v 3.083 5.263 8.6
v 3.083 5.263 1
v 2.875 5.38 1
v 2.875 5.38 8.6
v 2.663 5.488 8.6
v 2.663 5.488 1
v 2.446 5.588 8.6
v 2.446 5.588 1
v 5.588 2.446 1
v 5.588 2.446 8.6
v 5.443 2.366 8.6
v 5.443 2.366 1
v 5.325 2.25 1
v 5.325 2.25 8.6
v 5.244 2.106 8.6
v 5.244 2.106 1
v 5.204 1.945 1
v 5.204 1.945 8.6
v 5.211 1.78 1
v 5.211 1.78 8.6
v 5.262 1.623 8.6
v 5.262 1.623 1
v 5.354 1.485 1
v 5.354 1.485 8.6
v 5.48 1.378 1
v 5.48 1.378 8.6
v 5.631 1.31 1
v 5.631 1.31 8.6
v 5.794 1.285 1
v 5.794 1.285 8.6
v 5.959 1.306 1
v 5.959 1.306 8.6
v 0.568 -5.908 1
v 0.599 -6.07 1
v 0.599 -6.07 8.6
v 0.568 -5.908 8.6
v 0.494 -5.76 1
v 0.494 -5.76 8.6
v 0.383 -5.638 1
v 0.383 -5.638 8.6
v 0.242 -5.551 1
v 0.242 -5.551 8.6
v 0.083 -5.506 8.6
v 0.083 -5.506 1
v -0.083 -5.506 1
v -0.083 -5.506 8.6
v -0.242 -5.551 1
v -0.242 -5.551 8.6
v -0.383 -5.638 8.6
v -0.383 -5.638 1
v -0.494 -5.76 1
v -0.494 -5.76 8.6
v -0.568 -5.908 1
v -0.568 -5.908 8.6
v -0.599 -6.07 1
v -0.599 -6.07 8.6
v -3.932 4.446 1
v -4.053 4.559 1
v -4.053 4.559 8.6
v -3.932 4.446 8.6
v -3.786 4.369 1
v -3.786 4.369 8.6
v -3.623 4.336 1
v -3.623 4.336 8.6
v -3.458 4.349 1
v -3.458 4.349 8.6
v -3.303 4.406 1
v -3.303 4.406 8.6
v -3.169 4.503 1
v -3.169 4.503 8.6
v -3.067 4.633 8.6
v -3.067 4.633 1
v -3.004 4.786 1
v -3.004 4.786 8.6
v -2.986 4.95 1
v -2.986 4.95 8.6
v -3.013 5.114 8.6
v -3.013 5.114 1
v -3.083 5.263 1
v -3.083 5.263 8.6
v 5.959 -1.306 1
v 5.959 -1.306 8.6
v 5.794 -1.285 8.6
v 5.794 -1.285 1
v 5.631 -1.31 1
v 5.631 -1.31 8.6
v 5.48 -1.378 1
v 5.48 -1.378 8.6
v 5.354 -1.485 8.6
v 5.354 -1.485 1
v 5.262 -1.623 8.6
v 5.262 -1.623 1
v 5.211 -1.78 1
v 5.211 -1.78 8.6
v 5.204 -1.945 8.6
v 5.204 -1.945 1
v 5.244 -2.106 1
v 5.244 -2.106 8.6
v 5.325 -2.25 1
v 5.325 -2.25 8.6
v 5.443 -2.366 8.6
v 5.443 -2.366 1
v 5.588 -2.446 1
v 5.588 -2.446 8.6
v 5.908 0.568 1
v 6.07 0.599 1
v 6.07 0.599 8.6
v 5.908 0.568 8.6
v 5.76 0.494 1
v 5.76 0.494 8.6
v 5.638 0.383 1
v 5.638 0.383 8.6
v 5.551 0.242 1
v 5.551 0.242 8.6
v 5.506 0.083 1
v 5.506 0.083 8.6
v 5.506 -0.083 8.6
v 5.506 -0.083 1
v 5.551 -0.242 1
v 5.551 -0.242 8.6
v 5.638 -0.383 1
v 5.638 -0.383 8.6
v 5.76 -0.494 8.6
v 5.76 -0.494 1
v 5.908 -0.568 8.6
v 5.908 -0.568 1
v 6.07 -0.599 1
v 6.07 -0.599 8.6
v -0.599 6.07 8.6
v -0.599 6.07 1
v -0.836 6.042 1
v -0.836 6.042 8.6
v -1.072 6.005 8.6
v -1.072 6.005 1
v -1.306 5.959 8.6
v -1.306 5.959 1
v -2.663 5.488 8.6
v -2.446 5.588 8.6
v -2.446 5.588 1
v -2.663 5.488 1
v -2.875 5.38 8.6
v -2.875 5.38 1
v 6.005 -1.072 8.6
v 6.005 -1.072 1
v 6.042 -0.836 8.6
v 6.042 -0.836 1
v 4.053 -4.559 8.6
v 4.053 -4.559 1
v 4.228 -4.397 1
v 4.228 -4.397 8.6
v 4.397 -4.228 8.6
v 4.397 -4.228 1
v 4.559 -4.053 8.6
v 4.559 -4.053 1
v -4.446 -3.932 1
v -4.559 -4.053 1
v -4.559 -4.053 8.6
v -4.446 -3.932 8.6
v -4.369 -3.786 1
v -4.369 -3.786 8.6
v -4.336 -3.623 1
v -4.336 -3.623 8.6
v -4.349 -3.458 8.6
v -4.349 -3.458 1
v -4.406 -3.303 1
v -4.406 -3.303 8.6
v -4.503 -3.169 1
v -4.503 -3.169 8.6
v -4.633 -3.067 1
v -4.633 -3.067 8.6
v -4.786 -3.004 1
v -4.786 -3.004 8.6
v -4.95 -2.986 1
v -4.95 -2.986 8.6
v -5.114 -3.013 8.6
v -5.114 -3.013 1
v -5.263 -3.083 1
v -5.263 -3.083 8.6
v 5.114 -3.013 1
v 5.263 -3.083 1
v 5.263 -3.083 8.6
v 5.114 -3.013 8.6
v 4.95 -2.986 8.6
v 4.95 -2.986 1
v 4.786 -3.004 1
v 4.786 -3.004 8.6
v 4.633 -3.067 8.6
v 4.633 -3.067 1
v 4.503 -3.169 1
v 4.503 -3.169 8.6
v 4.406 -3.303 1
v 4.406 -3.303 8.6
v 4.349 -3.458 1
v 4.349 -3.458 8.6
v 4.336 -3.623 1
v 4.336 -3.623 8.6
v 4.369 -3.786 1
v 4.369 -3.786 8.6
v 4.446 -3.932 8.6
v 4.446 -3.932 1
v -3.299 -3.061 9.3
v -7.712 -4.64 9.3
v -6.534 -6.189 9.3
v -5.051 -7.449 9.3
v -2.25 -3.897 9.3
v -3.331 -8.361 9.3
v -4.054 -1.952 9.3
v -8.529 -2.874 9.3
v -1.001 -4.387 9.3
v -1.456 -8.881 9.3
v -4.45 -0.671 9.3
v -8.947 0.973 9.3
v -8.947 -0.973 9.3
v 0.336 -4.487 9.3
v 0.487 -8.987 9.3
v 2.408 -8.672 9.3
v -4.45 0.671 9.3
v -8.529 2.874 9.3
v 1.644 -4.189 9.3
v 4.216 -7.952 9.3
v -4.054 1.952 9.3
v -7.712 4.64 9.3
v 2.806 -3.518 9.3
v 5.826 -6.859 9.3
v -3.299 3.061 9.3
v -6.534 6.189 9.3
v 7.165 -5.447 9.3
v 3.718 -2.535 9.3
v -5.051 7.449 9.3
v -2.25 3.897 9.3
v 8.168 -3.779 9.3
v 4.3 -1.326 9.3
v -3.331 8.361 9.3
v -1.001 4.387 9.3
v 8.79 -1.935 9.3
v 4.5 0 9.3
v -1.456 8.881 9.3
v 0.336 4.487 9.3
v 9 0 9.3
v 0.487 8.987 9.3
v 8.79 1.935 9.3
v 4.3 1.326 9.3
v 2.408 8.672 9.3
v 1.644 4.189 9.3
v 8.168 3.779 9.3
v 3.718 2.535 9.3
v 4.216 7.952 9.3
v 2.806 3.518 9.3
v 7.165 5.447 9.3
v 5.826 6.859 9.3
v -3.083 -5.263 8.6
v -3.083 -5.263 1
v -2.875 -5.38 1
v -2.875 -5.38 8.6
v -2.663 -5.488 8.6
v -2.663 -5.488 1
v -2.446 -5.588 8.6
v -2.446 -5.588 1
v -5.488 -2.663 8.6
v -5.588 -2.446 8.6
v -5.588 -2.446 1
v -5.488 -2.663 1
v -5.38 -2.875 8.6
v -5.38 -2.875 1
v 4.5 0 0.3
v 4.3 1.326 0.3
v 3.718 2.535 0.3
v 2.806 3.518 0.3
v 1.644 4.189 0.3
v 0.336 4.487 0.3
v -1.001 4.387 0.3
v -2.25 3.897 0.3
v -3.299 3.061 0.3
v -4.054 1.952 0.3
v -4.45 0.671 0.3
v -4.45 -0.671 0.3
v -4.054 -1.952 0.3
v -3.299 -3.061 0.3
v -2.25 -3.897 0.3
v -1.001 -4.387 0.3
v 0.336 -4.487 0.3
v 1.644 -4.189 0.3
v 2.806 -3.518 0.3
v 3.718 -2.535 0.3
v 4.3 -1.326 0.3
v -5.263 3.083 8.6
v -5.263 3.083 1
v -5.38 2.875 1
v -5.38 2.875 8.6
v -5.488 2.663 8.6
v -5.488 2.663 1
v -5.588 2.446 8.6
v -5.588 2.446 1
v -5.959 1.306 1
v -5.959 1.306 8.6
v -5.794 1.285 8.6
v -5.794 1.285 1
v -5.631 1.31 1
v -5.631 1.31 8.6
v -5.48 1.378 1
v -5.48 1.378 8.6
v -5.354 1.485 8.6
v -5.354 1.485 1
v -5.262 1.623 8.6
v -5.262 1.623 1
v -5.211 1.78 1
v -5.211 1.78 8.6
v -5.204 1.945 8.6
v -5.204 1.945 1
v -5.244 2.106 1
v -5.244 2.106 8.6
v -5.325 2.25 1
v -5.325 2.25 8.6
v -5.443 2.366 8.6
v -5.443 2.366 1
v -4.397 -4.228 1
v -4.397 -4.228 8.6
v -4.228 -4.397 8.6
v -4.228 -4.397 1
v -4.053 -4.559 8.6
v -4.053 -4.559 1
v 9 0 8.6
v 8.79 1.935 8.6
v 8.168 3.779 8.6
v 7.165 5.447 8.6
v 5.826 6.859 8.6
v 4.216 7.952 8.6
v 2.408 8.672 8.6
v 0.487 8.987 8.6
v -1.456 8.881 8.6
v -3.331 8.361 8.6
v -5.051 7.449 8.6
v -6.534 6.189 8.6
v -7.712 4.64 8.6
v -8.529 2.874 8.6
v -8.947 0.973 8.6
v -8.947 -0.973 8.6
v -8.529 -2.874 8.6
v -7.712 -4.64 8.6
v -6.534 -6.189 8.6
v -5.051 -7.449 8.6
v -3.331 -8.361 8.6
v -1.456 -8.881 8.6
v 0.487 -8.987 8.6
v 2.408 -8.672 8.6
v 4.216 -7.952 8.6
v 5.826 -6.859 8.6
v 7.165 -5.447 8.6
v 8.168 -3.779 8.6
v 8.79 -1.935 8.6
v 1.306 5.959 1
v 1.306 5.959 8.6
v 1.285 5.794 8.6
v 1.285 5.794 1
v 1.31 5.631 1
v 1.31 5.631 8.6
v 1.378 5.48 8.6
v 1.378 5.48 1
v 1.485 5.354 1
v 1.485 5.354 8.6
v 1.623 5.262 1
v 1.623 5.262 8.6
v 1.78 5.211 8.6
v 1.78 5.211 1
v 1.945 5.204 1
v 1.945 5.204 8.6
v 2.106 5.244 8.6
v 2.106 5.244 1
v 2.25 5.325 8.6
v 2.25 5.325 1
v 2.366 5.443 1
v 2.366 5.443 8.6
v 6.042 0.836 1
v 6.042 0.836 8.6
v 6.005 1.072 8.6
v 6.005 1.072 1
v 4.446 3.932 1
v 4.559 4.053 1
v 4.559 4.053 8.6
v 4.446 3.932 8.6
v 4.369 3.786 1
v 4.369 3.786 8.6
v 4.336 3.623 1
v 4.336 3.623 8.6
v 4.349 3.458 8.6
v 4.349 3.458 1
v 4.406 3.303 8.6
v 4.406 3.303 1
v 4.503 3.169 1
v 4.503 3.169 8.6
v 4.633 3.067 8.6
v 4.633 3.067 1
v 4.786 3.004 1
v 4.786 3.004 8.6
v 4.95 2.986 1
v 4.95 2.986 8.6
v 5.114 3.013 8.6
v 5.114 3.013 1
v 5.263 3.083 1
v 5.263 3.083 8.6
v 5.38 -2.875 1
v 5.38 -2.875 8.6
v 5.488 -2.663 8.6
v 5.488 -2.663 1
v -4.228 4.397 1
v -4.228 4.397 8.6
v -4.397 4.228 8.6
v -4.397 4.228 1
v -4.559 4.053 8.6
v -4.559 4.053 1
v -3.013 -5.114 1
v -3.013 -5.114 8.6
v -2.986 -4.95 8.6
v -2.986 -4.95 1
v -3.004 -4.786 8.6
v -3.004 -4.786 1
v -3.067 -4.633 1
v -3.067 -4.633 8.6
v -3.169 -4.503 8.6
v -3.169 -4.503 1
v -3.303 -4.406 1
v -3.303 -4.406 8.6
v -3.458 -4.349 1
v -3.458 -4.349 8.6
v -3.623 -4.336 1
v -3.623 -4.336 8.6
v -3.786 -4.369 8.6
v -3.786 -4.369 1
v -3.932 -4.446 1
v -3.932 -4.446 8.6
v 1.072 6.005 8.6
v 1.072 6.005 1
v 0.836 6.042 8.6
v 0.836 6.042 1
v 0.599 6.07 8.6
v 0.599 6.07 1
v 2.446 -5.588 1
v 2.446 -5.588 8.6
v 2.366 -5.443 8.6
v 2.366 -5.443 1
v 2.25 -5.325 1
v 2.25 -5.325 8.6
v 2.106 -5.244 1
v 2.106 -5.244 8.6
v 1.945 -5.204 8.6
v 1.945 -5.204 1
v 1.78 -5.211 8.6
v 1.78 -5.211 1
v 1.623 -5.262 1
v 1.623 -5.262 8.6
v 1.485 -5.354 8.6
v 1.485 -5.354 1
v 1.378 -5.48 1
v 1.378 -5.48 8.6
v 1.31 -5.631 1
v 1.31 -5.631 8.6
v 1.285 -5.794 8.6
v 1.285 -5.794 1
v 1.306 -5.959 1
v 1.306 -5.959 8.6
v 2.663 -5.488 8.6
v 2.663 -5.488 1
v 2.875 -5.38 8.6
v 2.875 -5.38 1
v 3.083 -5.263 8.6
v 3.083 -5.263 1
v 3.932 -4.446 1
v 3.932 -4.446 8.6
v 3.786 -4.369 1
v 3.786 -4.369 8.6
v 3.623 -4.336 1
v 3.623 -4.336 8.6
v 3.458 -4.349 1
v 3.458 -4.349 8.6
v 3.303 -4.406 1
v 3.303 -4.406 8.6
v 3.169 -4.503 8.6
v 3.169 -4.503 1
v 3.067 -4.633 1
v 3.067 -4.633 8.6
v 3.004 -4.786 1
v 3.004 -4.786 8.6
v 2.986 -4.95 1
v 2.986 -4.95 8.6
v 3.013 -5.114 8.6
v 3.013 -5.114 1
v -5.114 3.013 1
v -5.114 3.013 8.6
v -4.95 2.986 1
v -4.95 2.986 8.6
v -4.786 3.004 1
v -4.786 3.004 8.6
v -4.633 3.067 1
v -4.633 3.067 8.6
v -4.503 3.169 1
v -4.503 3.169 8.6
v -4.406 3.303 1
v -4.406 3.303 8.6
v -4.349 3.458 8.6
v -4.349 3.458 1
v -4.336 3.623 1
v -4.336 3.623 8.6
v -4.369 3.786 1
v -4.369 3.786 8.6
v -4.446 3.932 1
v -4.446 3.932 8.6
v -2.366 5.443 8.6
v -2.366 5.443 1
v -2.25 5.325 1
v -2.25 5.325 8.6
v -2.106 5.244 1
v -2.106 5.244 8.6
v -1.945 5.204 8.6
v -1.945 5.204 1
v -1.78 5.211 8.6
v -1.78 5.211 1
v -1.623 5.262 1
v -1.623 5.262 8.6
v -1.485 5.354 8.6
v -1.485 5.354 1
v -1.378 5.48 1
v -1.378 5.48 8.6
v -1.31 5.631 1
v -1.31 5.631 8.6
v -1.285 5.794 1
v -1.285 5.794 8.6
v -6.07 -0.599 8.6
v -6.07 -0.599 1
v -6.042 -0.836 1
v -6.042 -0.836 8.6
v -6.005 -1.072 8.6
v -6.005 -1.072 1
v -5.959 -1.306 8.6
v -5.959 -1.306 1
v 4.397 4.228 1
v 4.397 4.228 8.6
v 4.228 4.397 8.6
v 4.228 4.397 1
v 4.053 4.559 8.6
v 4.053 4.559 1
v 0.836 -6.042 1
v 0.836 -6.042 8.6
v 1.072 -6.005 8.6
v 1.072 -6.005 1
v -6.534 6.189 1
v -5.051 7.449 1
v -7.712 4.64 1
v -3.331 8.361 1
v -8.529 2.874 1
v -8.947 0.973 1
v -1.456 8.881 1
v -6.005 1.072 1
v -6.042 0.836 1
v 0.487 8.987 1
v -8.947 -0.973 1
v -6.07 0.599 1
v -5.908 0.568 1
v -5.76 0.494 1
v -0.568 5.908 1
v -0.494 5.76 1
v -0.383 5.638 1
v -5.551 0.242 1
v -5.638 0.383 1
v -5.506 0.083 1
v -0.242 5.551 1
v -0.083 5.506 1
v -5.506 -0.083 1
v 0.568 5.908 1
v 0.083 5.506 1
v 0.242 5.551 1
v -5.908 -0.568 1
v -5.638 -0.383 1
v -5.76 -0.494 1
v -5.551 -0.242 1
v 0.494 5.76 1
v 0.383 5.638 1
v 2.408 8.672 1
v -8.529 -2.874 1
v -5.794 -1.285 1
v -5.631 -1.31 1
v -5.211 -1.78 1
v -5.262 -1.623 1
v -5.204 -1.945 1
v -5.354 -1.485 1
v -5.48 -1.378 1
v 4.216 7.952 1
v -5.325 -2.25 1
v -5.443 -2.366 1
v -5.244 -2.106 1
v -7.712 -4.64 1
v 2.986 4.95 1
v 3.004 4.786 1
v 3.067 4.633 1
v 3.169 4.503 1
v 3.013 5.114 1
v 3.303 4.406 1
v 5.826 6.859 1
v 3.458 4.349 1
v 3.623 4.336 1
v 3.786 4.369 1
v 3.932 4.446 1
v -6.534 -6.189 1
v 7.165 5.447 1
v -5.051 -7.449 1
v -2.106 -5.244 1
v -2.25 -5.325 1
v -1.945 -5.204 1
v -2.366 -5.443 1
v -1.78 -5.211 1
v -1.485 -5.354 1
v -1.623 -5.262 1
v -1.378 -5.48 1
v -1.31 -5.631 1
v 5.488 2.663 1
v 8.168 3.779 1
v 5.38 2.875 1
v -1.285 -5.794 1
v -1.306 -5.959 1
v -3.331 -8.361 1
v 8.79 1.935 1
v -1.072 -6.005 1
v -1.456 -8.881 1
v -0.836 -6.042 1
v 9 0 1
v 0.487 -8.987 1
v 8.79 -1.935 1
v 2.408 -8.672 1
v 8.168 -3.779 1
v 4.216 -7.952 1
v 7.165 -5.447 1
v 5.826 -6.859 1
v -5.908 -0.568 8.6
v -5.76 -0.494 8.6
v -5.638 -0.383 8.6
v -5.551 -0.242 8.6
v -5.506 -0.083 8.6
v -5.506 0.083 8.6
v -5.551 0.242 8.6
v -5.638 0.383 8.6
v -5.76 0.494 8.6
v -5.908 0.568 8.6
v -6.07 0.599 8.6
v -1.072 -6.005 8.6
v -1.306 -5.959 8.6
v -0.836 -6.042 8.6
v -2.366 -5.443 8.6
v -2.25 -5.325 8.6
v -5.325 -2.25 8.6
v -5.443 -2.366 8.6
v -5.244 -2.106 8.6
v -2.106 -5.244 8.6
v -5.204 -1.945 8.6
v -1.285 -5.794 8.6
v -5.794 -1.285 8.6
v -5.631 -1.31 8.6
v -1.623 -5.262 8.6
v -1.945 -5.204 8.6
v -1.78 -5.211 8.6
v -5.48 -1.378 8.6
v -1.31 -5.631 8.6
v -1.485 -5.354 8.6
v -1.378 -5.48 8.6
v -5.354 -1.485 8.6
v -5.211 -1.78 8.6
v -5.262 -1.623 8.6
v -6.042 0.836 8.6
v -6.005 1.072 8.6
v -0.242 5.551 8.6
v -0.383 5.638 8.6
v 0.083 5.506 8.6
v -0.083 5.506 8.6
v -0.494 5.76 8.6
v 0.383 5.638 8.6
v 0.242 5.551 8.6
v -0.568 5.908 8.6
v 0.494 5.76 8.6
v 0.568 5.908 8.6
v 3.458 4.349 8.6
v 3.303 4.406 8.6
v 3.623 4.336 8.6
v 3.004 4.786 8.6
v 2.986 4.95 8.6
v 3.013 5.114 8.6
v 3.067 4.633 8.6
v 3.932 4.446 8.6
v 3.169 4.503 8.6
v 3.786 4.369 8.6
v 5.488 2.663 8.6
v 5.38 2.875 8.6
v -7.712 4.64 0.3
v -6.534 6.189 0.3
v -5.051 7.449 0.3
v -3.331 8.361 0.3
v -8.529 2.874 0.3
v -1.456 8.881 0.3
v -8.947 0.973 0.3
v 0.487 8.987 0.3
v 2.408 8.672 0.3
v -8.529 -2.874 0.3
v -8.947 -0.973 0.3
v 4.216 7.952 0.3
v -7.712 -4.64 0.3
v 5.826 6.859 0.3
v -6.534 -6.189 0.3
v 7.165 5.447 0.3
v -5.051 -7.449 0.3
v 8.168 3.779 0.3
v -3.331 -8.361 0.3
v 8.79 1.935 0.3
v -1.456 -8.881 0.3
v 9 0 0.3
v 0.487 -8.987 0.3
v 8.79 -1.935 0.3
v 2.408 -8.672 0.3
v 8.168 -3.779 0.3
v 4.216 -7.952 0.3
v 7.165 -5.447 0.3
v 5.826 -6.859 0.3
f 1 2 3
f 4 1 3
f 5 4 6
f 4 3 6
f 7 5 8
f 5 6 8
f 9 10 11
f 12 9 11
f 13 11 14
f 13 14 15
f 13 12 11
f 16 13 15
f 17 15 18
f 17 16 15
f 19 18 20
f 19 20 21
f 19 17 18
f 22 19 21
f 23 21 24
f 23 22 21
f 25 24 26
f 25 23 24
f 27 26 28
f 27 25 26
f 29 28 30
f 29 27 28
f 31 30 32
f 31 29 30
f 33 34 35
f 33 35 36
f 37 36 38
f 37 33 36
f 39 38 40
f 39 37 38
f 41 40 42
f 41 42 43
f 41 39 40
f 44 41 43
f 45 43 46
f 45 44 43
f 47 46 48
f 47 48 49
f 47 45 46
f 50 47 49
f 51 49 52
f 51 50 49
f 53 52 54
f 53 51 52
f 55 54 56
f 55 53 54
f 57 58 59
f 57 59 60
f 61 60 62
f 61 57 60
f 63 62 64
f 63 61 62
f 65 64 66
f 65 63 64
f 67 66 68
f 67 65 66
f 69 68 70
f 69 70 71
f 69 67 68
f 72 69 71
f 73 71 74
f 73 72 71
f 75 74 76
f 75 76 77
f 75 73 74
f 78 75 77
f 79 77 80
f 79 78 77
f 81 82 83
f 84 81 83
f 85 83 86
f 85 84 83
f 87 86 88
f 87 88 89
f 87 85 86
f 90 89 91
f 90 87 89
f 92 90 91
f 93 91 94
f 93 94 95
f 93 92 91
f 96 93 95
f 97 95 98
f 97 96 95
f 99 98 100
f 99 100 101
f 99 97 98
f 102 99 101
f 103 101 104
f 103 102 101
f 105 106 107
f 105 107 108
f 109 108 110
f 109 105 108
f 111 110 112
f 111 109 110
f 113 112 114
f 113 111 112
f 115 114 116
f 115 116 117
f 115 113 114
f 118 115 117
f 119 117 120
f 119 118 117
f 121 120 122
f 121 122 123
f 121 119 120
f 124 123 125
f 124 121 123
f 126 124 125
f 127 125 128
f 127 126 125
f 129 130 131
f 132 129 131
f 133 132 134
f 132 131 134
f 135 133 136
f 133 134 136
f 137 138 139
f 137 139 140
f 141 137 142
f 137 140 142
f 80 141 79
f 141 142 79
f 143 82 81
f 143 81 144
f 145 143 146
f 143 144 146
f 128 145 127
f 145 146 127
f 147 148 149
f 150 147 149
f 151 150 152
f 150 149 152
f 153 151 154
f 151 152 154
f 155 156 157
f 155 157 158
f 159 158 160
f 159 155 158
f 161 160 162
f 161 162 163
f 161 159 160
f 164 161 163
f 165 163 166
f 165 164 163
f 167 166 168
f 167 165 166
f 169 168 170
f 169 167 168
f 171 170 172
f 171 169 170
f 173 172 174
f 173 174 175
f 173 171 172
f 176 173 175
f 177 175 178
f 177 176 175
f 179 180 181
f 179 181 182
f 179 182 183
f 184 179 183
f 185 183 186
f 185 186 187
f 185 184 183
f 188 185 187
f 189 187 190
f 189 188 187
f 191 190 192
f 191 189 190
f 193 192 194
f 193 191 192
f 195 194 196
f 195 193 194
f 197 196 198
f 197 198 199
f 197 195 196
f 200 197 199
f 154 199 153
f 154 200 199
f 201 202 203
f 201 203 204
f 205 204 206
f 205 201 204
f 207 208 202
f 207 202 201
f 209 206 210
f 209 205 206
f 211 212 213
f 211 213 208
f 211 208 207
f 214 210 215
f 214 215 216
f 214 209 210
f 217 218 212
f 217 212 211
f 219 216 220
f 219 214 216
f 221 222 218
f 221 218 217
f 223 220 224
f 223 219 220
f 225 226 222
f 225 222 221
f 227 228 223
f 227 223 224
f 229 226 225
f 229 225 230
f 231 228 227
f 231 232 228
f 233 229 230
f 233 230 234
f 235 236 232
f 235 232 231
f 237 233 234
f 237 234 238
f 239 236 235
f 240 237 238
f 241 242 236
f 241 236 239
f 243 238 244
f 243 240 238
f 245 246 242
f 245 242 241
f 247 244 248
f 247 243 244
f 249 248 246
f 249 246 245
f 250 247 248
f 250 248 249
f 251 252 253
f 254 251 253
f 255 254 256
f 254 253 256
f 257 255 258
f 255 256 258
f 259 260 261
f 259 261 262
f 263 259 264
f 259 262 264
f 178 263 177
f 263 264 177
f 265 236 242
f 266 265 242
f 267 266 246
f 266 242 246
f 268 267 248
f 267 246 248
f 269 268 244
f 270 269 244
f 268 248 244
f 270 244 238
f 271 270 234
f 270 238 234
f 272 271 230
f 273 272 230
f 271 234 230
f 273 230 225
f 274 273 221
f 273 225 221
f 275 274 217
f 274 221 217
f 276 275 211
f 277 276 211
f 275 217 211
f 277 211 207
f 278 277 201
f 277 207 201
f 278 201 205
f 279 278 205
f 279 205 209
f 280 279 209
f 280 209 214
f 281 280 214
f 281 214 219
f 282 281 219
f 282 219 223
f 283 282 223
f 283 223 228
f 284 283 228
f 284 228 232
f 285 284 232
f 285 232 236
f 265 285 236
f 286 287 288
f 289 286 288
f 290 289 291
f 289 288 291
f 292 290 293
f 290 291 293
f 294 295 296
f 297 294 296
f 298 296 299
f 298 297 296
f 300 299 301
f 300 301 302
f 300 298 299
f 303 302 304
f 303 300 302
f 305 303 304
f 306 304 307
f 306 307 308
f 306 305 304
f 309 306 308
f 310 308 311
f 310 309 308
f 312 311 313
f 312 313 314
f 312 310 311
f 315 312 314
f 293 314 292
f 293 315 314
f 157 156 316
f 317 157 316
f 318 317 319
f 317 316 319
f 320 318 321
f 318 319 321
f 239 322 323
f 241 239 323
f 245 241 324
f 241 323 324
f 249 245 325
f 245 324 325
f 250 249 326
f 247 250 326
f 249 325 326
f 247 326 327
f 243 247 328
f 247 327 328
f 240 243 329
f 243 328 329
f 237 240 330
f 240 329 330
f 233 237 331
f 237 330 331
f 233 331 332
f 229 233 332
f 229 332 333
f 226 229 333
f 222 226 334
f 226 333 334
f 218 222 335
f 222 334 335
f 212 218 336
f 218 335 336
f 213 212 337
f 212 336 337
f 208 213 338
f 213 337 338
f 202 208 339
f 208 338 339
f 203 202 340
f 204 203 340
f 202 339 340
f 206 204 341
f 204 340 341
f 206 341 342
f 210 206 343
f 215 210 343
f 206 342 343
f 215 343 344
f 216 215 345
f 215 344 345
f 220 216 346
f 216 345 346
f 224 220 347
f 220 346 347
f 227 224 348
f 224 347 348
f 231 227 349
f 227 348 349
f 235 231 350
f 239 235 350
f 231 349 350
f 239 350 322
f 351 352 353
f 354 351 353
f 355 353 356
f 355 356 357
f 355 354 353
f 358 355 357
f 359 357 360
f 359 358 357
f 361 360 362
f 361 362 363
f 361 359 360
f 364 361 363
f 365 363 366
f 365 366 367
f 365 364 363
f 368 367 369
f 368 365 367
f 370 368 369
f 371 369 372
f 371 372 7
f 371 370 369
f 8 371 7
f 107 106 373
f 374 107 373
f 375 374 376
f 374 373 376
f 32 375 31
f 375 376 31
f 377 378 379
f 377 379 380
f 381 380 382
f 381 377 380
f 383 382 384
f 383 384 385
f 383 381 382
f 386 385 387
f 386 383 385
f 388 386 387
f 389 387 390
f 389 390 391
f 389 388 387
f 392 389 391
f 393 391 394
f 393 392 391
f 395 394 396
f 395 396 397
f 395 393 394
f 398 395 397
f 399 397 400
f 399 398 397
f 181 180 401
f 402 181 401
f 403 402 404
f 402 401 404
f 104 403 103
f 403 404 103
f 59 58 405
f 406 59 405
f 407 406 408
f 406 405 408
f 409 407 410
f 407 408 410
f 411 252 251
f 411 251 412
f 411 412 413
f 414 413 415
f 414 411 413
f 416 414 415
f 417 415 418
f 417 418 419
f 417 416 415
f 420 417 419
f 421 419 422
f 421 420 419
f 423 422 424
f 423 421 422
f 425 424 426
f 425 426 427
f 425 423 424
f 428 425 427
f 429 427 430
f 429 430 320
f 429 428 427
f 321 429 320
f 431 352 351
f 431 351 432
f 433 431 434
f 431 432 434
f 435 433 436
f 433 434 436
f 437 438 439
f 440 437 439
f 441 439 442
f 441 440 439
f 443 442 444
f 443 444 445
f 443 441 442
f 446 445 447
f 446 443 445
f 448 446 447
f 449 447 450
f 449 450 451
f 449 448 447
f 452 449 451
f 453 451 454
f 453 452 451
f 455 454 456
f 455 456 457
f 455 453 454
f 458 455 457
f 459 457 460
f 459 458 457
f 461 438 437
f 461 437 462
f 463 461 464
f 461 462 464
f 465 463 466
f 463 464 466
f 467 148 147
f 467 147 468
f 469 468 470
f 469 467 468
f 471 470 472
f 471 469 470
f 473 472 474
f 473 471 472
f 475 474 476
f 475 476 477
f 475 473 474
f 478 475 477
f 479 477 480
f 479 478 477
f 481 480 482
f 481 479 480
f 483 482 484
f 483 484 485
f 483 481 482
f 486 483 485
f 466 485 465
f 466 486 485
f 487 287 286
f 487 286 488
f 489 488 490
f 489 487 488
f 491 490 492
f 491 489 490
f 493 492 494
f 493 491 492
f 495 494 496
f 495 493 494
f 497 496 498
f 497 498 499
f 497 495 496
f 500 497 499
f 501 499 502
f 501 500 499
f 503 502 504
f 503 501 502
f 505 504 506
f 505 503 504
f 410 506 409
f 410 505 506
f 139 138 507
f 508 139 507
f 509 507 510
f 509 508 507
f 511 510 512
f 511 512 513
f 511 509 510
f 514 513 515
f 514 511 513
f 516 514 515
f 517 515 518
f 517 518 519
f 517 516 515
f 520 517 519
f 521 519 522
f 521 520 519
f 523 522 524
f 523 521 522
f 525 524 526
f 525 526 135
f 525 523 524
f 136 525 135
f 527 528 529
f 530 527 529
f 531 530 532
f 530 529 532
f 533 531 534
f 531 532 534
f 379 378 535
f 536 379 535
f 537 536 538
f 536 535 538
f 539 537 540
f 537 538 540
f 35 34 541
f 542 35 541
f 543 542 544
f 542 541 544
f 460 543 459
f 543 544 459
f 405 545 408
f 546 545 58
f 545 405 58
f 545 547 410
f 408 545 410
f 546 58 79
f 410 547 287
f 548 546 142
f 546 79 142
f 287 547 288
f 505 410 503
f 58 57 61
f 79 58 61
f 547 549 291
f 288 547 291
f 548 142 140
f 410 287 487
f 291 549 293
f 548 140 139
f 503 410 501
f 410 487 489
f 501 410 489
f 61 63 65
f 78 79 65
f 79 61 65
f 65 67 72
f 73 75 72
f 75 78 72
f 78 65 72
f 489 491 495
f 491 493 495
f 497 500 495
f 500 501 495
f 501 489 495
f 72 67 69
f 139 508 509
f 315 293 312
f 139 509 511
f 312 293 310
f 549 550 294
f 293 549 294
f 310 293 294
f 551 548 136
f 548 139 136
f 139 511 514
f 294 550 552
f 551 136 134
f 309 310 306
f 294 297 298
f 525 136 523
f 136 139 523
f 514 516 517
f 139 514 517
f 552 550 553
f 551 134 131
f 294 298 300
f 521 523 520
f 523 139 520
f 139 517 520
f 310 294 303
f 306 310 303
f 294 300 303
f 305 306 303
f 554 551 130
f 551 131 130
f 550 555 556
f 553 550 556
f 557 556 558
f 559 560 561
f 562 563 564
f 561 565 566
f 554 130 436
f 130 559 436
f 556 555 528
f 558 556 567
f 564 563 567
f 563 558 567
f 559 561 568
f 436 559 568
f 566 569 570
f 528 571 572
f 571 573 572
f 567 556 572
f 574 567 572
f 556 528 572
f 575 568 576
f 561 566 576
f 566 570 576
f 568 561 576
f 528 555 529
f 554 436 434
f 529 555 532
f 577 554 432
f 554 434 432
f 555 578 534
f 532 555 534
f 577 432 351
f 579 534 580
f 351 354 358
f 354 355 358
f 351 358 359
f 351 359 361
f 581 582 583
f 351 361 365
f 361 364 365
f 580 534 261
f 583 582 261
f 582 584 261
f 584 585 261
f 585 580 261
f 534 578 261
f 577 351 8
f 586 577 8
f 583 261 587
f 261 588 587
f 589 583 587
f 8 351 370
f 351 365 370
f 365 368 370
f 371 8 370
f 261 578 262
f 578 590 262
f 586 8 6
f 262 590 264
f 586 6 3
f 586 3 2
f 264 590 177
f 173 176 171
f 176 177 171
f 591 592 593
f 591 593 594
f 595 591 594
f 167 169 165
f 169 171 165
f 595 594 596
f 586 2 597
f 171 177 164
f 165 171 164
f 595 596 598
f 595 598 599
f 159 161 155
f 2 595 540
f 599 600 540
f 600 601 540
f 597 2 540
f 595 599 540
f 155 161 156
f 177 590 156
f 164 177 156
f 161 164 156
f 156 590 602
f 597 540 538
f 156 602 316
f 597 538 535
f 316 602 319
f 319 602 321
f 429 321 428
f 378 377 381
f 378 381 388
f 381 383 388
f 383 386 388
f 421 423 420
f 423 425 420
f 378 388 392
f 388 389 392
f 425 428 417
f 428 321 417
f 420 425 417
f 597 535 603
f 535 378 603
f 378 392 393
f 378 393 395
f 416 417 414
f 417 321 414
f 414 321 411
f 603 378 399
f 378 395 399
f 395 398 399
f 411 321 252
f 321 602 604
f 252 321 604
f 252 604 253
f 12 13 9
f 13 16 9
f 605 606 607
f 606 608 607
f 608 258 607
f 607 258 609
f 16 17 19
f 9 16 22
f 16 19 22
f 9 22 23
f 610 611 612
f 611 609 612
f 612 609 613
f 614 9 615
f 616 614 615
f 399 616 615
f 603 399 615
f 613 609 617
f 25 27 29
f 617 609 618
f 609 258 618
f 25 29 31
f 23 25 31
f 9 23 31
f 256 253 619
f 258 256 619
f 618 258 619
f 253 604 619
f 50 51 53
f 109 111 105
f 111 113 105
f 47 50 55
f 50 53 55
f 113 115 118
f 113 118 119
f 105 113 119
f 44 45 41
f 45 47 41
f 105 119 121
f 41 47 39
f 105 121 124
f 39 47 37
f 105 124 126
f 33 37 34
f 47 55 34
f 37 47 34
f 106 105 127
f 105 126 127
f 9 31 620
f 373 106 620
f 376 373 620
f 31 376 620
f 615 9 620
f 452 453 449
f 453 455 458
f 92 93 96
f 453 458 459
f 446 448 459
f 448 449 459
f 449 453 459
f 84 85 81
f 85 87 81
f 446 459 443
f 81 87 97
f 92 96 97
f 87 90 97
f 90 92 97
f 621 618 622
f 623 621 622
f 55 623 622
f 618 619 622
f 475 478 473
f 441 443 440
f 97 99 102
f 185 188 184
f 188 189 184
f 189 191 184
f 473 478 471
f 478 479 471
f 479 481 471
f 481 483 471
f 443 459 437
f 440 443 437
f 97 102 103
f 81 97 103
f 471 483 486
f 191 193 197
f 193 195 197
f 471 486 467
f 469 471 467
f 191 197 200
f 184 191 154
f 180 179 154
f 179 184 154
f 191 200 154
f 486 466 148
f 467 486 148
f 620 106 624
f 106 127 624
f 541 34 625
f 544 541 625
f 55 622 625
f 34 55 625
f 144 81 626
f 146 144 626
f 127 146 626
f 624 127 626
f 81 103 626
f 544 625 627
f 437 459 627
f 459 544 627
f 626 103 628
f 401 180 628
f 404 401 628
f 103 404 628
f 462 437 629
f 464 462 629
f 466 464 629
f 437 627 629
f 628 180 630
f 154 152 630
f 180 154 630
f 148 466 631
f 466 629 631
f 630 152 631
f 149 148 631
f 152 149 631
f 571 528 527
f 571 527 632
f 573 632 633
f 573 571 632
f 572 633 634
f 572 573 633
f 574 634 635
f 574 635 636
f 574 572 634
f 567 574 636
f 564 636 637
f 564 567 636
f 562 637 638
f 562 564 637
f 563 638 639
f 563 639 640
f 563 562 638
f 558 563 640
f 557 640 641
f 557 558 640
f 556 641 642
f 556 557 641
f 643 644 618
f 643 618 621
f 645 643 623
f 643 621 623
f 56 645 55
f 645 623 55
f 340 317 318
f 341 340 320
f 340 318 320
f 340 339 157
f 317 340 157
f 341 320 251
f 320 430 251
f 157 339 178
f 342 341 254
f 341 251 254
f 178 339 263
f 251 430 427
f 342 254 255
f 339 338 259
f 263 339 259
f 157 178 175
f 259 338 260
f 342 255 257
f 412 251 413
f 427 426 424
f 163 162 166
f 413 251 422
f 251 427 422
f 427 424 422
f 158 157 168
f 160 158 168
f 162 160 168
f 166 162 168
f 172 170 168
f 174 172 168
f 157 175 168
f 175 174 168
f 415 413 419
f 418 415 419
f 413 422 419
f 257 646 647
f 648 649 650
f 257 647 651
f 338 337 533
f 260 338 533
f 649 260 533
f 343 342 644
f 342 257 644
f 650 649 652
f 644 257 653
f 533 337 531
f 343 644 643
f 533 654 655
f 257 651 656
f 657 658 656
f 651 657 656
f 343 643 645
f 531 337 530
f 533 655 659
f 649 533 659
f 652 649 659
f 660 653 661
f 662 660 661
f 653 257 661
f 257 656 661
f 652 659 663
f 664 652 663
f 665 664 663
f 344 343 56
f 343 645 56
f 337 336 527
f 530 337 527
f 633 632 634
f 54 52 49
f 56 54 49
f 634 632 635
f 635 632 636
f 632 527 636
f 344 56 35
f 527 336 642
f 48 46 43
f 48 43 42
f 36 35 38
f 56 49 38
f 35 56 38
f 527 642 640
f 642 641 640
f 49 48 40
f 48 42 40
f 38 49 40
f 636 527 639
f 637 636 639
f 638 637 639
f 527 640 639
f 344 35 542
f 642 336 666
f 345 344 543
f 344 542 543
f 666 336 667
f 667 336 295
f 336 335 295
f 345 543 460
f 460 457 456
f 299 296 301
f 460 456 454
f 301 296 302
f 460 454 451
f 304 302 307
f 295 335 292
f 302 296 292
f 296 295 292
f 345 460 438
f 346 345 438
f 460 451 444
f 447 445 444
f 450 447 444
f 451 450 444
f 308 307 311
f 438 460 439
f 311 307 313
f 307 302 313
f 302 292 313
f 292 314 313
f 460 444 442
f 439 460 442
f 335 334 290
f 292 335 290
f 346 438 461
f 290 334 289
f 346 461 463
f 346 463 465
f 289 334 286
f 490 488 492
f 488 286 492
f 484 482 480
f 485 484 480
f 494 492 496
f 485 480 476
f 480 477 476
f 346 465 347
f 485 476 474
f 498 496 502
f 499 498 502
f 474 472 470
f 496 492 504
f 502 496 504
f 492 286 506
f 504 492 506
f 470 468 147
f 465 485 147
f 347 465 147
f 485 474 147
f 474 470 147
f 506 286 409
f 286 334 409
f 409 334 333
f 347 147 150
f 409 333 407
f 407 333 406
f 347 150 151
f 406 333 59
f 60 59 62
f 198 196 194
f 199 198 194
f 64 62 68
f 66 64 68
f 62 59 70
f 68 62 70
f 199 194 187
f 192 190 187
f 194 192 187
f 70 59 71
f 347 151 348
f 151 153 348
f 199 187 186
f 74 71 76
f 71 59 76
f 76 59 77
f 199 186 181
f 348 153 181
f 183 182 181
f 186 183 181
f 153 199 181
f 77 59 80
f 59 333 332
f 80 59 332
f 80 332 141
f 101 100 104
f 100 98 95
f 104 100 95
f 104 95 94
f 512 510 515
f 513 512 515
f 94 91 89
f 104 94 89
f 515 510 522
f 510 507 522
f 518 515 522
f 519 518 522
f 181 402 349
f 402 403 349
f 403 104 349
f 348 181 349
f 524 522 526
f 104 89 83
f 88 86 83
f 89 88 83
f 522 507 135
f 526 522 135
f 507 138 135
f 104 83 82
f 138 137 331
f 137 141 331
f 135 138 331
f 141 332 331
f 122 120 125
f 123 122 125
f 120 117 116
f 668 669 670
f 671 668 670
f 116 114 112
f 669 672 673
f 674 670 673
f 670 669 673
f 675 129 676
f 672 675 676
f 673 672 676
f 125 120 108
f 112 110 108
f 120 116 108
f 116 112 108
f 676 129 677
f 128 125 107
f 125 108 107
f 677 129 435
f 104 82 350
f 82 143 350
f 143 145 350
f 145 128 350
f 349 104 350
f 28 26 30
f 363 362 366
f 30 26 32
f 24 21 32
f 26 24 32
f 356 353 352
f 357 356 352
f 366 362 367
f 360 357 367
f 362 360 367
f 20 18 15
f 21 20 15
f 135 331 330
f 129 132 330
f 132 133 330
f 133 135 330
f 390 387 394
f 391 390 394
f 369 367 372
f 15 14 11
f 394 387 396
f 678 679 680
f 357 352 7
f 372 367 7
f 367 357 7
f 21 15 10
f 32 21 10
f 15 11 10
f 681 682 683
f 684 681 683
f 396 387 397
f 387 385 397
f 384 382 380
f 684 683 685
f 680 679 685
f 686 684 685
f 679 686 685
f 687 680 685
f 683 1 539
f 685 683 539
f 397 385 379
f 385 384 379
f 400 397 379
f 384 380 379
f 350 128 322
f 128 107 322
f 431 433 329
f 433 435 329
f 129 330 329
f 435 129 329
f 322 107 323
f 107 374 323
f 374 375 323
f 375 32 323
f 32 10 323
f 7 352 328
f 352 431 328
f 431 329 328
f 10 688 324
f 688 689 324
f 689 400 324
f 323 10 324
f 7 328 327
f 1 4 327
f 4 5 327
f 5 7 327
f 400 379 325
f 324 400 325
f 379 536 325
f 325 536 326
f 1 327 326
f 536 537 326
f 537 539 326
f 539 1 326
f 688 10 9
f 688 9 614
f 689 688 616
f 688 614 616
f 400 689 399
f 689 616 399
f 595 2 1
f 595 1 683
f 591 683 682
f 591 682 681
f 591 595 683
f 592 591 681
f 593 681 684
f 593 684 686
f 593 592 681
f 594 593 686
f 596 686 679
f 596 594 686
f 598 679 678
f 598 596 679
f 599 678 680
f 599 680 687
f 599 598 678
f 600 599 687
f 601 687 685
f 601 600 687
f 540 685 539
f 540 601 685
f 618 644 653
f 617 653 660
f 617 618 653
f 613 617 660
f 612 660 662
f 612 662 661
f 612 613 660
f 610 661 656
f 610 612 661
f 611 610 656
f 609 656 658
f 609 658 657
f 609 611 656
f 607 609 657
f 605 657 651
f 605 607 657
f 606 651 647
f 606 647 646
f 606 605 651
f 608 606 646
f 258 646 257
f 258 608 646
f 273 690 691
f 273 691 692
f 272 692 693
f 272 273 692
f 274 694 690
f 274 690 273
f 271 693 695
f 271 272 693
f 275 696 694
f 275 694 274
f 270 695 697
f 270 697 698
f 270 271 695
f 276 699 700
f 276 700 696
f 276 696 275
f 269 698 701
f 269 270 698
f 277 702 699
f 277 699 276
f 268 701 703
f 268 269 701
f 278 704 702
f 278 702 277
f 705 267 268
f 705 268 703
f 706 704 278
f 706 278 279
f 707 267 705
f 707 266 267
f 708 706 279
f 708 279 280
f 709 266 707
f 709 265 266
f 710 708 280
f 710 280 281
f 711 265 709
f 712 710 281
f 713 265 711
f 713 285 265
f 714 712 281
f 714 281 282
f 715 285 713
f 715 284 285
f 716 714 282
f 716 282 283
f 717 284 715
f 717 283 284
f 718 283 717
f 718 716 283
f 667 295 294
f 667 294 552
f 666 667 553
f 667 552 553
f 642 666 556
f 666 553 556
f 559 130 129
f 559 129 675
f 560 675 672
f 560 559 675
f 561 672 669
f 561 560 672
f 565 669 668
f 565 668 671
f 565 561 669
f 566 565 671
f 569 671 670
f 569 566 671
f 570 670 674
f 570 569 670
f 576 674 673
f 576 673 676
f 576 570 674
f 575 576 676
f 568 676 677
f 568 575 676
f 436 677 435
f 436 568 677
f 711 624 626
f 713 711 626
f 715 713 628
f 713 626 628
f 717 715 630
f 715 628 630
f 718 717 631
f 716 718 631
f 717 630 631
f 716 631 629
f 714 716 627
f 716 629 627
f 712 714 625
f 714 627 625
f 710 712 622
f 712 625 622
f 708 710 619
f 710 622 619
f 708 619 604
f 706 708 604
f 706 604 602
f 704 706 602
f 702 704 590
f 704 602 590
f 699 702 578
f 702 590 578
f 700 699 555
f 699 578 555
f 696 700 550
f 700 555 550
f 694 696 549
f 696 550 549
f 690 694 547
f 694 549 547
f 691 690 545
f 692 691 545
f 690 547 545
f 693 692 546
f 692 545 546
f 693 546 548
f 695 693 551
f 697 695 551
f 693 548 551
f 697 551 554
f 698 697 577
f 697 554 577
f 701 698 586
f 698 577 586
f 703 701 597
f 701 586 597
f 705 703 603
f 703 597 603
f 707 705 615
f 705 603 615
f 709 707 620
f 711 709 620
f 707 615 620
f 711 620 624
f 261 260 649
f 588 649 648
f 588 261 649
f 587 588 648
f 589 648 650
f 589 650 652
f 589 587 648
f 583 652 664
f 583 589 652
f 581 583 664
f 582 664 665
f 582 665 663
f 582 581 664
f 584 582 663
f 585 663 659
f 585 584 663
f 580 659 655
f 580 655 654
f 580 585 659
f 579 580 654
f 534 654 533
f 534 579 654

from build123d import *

# Parameters (mm, degrees)
CYLINDER_R        = 0.6
CYLINDER_DEPTH    = 7.6
ARRAY_COUNT       = 20
CYLINDER001_R     = 6.1
CYLINDER001_DEPTH = 7.6
SKETCH_R          = 9
PAD_DEPTH         = 0.7
SKETCH001_R       = 9
PAD001_DEPTH      = 0.7
SKETCH002_R       = 4.5
POCKET_DEPTH      = 9.001


with BuildPart() as array:
    # Cylinder → Cylinder (new body)
    with BuildSketch(Plane(origin=(6.1, 0, 0), x_dir=(1, 0, 0), z_dir=(0, 0, 1))):
        Circle(CYLINDER_R)
    extrude(amount=CYLINDER_DEPTH)

    # Array: Array ×20 about axis
    array_axis = Axis((0, 0, 0), (0, 0, 1))


with BuildPart() as array_1:
    add(array.part)
    for i in range(1, ARRAY_COUNT):
        add(array.part.rotate(array_axis, i * 360 / ARRAY_COUNT))


with BuildPart() as pocket:
    # Cylinder001 → Cylinder001 (new body)
    with BuildSketch(Plane.XY):
        Circle(CYLINDER001_R)
    extrude(amount=CYLINDER001_DEPTH)

    # Cut: cut Array
    add(array_1.part, mode=Mode.SUBTRACT)


with BuildPart() as pocket_1:
    # Cut placement: moved
    add(pocket.part.moved(Location((0, 0, 1))))

    # Sketch → Pad (new body)
    with BuildSketch(Plane.XY.offset(8.6)):
        Circle(SKETCH_R)
    extrude(amount=PAD_DEPTH)

    # Sketch001 → Pad001 (new body)
    with BuildSketch(Plane(origin=(0, 0, 1), x_dir=(1, 0, 0), z_dir=(0, 0, -1))):
        Circle(SKETCH001_R)
    extrude(amount=PAD001_DEPTH)

    # Sketch002 → Pocket (cut, through all)
    with BuildSketch(Plane.XY.offset(9.3)):
        Circle(SKETCH002_R)
    extrude(amount=-POCKET_DEPTH, mode=Mode.SUBTRACT)


solid = pocket_1.part
